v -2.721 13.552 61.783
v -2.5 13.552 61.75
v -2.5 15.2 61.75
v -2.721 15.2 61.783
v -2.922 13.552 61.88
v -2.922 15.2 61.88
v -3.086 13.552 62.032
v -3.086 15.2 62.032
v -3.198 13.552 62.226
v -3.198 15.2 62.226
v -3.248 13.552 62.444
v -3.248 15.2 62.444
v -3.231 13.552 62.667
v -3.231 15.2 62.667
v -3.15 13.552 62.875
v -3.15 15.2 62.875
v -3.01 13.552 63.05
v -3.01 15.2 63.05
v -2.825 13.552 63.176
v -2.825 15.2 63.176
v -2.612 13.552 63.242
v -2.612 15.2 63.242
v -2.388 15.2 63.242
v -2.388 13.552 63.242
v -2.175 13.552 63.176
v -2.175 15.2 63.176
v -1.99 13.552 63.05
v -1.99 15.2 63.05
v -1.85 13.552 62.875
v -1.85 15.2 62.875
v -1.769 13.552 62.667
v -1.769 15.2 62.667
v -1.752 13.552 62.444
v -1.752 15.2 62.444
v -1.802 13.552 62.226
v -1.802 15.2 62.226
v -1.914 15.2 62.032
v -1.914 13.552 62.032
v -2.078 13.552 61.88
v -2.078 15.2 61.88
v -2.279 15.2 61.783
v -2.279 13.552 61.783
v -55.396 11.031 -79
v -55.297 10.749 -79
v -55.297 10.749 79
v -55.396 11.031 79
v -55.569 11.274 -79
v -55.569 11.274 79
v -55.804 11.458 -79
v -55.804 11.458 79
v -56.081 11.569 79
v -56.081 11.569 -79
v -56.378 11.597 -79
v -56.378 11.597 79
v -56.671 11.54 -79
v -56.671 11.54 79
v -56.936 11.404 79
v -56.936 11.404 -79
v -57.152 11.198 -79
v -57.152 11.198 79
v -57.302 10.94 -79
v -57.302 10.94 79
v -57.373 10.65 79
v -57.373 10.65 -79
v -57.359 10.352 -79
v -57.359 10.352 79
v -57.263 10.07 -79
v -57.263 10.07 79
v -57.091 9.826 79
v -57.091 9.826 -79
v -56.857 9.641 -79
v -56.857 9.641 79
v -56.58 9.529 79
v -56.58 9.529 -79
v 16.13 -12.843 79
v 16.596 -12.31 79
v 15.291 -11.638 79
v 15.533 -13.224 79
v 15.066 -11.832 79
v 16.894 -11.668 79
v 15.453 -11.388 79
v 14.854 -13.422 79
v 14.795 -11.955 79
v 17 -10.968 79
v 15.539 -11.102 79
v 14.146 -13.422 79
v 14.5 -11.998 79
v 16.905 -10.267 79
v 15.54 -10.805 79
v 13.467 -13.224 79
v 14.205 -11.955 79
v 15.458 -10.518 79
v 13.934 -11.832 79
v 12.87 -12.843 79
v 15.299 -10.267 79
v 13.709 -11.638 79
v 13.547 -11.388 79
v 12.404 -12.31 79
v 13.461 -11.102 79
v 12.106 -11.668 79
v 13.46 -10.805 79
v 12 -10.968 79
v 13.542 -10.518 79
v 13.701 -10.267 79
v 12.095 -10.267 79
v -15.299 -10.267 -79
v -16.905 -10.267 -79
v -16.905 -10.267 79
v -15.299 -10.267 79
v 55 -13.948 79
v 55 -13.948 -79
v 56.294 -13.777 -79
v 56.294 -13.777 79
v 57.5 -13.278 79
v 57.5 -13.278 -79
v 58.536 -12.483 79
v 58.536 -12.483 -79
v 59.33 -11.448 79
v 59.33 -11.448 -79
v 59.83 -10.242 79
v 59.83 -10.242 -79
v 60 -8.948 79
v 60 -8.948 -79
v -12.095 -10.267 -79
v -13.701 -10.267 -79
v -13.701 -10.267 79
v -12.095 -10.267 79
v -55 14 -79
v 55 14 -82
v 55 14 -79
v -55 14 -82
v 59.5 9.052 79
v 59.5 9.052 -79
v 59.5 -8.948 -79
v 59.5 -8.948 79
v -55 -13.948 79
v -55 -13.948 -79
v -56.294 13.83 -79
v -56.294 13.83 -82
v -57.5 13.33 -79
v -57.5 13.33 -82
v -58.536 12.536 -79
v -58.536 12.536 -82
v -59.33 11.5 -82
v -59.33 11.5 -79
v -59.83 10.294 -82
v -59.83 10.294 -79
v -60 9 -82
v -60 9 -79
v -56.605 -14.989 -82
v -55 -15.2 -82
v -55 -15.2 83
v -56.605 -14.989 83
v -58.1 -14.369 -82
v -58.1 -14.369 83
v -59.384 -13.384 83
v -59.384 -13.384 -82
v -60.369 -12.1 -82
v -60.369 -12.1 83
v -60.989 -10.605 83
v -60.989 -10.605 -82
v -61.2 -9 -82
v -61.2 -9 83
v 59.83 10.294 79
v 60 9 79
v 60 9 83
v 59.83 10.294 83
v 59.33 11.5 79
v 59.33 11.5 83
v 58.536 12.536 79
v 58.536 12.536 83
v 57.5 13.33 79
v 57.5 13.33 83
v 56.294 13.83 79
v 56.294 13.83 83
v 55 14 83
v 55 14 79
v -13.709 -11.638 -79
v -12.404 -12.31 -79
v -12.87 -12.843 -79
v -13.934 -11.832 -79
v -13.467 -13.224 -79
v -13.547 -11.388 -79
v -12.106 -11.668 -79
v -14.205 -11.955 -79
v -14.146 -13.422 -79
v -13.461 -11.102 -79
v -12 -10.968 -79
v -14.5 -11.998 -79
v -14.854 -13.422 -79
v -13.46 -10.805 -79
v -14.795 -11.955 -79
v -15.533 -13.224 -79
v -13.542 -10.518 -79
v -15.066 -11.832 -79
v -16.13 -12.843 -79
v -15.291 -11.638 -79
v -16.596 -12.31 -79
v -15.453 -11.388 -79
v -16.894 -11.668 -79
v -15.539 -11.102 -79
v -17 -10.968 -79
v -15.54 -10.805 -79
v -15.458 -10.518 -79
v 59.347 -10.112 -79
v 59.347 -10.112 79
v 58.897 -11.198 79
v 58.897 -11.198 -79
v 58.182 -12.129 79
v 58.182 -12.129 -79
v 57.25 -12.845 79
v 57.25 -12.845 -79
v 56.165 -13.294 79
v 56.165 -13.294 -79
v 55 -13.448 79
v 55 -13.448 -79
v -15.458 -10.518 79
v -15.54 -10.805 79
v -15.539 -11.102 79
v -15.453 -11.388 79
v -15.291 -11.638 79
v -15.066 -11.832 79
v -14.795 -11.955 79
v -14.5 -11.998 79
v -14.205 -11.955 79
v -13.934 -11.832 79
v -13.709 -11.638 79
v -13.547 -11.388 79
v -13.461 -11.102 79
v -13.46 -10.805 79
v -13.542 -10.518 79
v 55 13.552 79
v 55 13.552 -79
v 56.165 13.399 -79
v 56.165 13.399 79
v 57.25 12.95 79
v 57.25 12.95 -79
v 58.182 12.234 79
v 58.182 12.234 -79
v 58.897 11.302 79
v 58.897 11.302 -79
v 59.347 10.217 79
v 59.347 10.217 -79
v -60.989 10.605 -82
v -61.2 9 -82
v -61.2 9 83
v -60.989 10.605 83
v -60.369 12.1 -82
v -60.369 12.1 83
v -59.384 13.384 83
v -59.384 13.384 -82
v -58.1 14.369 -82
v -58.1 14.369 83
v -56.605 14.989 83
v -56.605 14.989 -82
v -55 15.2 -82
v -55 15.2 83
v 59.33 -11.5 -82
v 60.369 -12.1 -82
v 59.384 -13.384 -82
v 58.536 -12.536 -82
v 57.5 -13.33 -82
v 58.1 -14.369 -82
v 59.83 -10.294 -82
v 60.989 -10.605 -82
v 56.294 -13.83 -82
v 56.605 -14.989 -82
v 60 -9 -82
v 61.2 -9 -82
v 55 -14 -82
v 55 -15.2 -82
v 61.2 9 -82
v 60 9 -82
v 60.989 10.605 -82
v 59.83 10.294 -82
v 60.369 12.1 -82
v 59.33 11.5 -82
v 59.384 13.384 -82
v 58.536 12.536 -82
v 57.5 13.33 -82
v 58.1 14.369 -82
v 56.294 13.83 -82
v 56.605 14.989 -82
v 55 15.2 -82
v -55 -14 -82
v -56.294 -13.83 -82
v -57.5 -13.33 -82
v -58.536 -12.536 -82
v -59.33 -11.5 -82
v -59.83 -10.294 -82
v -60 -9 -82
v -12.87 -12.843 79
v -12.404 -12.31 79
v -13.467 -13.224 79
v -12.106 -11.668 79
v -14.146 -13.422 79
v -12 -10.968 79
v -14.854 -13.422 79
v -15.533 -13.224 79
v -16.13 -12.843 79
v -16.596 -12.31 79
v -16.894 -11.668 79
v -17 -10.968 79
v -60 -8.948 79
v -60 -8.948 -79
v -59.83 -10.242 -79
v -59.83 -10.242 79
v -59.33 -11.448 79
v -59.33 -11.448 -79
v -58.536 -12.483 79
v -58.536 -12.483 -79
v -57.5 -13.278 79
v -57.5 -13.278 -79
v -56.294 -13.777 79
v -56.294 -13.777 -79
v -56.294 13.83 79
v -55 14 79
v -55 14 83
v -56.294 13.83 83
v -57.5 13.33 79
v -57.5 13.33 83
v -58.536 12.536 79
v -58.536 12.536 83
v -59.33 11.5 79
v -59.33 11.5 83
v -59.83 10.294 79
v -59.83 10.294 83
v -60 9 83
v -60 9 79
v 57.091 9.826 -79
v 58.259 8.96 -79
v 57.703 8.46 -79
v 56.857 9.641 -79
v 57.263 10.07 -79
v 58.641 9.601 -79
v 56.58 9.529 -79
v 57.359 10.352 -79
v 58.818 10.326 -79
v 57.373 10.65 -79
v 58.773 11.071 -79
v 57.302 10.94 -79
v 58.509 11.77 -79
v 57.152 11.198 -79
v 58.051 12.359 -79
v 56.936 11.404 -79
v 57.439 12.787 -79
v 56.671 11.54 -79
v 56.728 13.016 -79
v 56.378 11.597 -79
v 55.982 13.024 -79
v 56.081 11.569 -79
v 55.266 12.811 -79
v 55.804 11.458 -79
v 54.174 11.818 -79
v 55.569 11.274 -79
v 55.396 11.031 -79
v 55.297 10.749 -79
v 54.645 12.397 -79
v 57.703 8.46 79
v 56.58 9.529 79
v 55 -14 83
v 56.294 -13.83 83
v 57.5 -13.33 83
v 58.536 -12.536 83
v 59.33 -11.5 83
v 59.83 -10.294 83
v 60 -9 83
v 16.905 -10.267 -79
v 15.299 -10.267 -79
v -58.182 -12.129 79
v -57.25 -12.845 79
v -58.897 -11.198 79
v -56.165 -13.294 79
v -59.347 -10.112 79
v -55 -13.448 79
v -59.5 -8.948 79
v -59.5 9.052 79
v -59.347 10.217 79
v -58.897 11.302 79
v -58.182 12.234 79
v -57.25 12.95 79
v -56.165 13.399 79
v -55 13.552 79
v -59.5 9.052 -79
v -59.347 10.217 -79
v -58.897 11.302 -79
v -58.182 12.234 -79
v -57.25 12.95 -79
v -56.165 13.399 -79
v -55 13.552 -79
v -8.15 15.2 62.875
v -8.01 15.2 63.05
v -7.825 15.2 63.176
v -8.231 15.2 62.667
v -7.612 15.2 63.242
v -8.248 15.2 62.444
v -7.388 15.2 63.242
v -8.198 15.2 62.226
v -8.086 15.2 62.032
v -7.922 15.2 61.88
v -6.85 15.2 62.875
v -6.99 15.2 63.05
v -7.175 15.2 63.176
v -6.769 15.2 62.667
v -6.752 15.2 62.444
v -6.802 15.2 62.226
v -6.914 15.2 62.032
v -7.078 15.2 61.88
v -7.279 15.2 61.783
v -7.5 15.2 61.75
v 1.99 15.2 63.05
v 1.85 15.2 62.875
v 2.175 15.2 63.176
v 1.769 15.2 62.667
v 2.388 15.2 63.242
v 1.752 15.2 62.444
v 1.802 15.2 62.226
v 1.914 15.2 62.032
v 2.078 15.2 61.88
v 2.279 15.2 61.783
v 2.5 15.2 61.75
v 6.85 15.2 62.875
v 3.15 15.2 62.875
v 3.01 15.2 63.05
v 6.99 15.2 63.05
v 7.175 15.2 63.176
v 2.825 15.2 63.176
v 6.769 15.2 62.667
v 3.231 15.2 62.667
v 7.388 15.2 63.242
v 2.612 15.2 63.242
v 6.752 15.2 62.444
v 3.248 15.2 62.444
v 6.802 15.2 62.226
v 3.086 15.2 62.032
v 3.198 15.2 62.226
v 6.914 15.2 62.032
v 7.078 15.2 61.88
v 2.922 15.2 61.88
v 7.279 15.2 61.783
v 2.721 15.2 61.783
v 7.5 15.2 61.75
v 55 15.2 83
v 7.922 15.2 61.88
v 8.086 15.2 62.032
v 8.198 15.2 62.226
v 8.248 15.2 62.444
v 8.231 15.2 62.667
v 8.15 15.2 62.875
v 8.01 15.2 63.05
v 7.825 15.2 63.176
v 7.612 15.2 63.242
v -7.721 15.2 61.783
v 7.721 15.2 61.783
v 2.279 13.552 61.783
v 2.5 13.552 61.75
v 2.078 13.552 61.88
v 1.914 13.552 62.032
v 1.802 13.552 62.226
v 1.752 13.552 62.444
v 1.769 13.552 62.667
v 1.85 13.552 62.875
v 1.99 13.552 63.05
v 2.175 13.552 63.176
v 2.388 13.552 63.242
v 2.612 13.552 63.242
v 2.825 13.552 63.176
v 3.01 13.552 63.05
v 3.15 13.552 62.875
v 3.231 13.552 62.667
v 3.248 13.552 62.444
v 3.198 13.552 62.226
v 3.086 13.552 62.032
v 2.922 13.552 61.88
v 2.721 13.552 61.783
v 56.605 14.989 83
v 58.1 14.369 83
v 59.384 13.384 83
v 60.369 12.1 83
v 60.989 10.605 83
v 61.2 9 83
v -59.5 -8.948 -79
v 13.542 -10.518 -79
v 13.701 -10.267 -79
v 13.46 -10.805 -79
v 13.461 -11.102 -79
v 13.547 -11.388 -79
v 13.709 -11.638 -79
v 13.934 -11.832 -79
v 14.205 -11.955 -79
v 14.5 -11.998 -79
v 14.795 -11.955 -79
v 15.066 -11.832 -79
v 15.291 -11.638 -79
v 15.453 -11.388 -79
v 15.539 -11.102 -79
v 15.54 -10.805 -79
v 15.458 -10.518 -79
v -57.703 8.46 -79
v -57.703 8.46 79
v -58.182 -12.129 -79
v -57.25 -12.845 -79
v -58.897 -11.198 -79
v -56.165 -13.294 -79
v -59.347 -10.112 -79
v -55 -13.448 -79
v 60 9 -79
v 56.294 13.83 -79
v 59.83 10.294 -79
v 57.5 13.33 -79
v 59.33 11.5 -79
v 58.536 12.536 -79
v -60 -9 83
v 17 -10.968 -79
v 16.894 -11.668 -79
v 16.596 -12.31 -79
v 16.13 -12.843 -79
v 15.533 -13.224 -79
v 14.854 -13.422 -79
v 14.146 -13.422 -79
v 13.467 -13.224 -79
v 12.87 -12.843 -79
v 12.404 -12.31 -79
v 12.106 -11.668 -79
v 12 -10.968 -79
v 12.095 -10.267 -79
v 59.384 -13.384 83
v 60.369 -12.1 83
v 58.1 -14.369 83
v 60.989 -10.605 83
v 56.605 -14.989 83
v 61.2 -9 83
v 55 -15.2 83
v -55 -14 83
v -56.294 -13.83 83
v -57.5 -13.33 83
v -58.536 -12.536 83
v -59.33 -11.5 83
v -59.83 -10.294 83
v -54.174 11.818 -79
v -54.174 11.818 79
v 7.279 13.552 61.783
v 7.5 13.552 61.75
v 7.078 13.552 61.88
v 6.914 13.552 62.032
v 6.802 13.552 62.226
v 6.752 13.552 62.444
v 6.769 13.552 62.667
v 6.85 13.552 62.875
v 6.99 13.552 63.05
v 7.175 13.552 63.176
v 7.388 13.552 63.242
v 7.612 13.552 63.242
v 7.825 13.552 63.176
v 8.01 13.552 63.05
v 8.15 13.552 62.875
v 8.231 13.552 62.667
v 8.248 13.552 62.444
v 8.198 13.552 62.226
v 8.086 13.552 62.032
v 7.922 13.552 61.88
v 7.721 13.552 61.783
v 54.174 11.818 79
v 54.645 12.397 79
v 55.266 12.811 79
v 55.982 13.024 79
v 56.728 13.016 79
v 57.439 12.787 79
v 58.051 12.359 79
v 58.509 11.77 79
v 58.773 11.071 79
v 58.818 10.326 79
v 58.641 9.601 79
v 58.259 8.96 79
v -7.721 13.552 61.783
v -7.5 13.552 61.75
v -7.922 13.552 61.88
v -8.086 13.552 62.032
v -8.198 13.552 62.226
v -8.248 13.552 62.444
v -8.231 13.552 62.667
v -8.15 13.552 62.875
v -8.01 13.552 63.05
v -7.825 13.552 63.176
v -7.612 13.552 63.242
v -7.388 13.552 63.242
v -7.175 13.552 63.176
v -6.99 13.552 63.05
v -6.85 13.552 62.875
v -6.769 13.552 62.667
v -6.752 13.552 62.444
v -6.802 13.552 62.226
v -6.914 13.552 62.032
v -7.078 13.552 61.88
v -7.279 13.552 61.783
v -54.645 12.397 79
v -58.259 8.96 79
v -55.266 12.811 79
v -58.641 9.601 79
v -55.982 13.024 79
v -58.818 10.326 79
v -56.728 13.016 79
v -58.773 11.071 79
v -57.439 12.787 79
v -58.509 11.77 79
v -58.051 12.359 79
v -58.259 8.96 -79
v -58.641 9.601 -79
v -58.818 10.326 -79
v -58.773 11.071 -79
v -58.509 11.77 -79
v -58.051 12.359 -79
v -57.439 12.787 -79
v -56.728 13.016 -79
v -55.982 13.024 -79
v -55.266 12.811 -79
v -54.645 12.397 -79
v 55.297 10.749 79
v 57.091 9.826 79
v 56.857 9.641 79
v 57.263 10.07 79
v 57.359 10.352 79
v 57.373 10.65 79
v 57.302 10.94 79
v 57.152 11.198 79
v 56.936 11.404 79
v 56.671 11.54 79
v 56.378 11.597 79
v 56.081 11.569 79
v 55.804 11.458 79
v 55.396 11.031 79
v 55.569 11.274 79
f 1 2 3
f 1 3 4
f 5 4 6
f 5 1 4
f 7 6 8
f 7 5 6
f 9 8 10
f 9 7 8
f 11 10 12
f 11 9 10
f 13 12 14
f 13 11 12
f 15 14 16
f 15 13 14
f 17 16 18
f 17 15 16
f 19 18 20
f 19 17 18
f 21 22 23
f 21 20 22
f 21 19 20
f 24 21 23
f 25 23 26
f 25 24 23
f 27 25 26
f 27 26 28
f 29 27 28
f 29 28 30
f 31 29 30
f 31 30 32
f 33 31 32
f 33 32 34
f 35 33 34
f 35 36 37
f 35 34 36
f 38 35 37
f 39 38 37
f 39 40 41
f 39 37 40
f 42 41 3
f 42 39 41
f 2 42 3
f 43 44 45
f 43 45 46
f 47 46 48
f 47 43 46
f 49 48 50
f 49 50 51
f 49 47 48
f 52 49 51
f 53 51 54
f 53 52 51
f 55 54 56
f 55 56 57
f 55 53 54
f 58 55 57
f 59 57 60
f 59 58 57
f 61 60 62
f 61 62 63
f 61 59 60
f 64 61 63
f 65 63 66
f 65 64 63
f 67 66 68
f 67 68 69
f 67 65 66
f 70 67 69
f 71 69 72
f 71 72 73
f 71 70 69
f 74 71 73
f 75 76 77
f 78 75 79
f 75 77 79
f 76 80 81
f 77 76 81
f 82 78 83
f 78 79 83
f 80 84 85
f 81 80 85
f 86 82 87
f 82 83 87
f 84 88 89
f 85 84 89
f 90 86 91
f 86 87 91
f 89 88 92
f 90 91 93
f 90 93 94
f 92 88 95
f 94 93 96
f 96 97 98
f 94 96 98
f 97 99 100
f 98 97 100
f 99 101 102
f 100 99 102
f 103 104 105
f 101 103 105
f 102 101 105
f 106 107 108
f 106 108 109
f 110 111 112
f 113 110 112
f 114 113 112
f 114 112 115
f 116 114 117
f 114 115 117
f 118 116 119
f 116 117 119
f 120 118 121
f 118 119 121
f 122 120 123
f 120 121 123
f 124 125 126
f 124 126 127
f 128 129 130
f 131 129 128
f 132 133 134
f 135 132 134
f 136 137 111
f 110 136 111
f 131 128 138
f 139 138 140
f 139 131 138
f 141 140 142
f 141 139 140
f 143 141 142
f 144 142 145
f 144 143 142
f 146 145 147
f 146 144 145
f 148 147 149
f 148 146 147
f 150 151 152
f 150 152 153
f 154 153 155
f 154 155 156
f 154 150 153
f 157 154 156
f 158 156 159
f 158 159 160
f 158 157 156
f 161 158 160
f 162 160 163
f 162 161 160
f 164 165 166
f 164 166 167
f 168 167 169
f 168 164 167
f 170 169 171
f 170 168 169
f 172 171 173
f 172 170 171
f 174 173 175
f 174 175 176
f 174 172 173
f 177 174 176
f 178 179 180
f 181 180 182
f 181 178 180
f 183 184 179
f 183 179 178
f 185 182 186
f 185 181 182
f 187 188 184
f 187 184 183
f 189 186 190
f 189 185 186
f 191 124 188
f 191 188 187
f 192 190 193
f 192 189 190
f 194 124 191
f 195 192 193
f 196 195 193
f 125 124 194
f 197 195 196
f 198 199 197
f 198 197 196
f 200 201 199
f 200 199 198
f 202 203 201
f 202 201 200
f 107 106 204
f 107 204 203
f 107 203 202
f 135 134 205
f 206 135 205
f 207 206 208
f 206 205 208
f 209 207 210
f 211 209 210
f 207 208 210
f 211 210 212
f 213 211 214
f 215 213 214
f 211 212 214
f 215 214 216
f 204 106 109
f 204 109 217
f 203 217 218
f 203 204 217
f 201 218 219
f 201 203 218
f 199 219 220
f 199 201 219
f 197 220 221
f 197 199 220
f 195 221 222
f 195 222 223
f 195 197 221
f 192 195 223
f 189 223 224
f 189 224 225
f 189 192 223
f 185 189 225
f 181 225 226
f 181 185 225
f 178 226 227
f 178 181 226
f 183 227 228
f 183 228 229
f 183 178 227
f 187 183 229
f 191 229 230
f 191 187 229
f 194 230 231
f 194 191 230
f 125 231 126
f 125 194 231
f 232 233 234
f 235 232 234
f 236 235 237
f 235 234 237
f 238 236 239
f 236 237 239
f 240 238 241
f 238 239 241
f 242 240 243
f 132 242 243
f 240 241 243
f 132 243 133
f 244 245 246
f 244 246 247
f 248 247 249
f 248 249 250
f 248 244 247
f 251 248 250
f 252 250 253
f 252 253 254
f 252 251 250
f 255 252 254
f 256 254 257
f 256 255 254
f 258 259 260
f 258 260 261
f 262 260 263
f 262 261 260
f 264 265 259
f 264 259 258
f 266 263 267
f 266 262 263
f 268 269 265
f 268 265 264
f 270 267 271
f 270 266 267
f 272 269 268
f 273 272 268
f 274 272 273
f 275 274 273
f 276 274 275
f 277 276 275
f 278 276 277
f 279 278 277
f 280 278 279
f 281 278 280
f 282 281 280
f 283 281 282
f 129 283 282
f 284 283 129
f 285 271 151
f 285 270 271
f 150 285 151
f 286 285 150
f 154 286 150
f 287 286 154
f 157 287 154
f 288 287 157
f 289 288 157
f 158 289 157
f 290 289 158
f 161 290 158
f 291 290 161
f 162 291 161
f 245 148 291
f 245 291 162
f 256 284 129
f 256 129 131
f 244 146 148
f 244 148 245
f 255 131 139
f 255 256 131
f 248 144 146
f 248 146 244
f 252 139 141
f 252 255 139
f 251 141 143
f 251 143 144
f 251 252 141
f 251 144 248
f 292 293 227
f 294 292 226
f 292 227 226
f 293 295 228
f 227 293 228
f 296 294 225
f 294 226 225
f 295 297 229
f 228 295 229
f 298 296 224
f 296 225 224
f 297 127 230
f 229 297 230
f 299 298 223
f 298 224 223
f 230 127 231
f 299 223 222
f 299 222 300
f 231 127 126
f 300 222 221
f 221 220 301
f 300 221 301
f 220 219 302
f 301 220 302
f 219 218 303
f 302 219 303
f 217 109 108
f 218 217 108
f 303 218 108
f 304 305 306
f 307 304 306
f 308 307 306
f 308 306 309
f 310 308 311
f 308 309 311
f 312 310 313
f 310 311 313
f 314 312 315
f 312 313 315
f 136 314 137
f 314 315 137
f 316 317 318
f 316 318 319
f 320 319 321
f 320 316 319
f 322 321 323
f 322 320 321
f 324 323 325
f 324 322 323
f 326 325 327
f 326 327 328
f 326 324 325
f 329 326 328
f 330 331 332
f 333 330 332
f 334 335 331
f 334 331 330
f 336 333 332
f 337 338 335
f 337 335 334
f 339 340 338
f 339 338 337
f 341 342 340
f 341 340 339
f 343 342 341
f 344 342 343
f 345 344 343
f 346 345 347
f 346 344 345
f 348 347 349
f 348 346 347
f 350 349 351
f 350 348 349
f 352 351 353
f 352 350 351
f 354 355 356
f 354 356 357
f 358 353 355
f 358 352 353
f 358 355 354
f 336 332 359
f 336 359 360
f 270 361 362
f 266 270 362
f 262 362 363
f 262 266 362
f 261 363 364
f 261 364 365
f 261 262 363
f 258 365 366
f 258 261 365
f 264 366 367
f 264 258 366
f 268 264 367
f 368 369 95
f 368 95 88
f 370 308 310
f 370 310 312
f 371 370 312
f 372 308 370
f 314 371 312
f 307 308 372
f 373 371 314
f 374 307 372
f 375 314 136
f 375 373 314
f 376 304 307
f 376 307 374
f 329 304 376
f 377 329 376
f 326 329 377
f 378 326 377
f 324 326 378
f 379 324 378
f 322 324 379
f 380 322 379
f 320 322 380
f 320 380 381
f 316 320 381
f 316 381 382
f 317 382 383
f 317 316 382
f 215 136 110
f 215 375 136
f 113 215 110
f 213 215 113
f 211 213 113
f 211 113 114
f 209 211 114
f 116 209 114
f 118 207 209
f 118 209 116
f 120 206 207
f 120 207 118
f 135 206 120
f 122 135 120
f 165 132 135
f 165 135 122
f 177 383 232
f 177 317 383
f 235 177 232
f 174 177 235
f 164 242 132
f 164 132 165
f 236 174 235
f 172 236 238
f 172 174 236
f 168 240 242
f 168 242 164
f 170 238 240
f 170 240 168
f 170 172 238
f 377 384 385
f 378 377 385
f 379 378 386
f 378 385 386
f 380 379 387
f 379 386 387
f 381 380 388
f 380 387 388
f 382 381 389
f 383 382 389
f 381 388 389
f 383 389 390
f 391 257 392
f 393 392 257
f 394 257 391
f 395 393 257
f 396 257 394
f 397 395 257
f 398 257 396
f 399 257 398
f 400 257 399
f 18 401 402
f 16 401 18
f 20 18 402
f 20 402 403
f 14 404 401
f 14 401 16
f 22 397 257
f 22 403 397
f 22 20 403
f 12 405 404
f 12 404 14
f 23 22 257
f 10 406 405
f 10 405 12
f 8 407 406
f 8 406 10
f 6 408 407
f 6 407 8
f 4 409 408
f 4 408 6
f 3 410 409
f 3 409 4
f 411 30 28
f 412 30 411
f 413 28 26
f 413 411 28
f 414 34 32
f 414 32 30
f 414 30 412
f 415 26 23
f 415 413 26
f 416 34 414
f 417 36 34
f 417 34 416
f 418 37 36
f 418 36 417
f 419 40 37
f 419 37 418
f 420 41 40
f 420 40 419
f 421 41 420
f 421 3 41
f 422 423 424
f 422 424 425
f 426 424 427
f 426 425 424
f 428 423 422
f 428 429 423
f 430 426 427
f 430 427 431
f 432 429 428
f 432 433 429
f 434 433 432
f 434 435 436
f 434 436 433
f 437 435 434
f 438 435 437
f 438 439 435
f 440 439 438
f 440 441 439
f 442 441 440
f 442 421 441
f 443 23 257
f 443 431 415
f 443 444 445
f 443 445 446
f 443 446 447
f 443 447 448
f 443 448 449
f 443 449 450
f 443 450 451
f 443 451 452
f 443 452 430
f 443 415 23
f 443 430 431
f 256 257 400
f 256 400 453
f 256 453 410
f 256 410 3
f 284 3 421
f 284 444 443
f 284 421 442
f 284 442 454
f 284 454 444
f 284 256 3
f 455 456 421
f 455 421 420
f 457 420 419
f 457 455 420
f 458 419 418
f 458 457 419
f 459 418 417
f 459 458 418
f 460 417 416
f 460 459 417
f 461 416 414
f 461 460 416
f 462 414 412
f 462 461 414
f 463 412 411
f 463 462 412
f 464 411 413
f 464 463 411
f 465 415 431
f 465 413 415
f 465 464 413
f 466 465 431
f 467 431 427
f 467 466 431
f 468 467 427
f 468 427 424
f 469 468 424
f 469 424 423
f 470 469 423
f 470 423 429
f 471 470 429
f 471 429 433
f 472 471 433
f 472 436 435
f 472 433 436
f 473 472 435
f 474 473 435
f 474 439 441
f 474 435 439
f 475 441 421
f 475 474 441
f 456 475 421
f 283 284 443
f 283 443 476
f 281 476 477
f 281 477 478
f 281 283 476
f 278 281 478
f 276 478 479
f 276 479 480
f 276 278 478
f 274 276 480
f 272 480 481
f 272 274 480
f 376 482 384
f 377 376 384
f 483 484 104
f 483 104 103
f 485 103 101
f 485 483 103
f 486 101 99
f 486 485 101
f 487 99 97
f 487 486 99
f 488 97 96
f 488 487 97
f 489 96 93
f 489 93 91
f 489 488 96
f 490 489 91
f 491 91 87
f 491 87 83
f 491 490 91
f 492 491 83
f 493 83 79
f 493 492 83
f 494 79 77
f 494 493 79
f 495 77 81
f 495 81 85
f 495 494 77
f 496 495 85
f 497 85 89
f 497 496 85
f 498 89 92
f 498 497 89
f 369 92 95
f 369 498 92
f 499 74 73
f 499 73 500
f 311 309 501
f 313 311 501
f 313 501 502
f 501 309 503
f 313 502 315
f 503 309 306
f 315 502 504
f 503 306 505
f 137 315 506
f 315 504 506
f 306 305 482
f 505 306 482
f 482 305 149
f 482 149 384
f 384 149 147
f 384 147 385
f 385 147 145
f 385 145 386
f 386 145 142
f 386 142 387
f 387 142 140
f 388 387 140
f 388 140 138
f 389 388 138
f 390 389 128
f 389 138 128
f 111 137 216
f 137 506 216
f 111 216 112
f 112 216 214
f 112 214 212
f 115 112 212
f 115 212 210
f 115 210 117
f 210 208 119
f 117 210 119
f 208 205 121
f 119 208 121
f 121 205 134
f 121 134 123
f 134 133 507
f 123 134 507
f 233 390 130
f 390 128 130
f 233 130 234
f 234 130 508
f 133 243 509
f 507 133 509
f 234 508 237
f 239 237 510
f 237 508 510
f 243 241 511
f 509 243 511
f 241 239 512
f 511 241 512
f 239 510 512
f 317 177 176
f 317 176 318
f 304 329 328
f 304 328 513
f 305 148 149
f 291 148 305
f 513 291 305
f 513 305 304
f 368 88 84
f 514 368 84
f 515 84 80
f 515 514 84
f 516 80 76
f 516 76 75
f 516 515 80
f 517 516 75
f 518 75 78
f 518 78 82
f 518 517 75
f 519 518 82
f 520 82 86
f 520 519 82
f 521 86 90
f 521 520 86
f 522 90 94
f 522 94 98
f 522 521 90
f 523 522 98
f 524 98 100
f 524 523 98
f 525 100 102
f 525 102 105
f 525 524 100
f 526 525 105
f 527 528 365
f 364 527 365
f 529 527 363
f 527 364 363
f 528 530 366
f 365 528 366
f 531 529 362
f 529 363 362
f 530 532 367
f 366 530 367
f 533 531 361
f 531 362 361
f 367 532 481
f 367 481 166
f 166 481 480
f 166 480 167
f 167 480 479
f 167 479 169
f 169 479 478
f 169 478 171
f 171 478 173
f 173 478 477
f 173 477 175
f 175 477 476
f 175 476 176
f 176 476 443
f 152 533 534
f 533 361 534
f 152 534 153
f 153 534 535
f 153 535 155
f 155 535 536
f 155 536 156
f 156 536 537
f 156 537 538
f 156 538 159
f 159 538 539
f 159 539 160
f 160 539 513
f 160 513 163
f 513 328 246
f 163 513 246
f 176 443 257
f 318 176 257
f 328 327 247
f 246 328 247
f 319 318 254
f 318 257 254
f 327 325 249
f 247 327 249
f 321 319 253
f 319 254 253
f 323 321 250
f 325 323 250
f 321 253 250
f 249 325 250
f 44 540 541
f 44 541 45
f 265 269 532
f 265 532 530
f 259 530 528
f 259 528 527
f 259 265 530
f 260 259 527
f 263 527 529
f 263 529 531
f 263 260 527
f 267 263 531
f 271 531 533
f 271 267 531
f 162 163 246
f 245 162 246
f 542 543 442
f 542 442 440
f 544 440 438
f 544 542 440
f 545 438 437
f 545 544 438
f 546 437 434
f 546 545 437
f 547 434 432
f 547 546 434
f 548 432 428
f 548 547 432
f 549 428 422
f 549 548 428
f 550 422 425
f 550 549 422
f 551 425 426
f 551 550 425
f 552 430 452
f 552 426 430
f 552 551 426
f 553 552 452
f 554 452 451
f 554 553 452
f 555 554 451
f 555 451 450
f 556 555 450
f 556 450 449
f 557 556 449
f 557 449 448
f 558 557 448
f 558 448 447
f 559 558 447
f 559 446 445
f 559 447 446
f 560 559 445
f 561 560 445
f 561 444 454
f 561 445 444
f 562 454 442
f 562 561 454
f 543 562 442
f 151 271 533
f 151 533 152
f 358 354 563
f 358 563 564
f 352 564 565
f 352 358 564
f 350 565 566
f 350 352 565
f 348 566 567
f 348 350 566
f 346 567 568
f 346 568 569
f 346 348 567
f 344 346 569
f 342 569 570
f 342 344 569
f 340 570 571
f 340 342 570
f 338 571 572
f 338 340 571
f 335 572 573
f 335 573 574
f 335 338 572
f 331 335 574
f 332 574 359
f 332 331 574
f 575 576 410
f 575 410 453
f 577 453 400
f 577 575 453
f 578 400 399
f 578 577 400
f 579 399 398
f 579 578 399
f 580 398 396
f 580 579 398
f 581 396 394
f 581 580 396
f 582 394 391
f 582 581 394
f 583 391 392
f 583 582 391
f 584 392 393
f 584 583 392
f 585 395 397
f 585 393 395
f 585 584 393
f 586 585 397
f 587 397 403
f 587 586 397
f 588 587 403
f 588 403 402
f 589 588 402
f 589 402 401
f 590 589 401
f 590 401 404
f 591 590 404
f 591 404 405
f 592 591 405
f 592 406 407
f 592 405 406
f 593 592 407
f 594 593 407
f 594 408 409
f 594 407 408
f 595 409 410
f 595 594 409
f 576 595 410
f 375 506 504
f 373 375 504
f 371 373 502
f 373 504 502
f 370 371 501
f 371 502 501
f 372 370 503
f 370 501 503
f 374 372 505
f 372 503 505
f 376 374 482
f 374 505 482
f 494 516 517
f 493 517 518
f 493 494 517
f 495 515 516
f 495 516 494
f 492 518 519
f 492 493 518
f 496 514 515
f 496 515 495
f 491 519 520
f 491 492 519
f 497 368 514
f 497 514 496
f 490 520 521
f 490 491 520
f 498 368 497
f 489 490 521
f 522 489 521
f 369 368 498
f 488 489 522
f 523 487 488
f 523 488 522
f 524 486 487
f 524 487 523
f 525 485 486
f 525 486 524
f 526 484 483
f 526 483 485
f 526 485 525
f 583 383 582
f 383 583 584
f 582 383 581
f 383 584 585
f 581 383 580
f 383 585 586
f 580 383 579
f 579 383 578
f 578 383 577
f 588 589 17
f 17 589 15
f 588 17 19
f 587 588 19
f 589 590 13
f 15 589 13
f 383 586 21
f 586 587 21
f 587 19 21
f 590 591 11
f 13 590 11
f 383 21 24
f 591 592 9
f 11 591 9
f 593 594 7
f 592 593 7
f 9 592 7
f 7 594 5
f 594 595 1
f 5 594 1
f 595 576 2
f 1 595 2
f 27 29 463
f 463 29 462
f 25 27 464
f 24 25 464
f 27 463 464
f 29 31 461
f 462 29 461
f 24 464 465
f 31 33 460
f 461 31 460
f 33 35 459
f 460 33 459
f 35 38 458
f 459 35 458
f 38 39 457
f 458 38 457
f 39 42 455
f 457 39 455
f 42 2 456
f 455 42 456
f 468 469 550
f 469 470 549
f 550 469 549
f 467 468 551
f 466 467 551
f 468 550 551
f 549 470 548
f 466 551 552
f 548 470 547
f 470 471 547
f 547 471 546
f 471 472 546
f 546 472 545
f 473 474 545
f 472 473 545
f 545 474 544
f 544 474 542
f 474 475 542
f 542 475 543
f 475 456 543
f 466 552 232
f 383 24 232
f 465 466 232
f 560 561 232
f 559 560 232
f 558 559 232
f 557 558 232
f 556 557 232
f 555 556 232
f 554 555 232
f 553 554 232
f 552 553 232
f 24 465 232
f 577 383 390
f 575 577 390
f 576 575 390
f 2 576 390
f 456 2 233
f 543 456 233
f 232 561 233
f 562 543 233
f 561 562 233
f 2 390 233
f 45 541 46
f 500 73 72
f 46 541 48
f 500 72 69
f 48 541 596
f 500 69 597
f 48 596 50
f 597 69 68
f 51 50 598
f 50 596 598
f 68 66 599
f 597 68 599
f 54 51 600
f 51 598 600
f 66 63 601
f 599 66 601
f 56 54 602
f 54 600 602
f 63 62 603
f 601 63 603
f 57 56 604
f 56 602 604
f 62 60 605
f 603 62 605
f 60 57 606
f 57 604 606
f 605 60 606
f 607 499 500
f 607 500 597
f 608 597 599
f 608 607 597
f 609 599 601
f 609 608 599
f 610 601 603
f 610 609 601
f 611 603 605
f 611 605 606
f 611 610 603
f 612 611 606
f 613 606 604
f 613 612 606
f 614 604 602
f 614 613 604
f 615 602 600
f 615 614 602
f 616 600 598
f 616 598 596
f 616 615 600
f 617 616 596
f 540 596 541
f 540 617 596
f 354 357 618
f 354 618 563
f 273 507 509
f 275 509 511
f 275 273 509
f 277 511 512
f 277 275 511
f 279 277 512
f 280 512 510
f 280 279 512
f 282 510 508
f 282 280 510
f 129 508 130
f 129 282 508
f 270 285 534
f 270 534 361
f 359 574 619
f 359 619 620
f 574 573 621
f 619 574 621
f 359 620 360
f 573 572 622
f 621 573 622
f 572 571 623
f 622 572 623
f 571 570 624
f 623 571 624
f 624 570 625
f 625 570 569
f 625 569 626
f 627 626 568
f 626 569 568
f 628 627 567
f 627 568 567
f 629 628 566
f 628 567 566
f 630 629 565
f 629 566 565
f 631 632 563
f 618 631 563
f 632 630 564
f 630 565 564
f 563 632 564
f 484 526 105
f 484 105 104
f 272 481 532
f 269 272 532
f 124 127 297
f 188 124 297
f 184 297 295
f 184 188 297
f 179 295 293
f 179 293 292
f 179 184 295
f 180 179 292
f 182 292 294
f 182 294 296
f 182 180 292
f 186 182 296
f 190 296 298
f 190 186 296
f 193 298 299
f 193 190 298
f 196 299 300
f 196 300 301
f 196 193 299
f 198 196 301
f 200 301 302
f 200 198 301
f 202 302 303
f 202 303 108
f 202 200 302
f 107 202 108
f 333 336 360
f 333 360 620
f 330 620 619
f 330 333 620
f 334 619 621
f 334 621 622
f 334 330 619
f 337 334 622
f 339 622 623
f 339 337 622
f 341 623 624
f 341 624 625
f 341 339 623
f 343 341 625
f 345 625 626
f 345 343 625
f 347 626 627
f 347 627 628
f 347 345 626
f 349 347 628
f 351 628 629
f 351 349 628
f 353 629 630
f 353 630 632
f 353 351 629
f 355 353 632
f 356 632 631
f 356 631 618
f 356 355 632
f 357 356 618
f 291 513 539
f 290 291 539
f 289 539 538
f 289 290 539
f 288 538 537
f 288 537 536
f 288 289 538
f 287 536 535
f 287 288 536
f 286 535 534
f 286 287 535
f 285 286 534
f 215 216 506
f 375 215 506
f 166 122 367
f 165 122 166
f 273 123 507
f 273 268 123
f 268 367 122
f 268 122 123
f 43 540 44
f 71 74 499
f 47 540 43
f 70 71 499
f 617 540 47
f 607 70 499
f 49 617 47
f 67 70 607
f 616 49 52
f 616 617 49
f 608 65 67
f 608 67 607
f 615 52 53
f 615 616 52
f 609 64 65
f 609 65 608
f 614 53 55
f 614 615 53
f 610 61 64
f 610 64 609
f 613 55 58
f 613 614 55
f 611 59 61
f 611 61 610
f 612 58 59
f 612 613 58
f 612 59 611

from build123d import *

# Parameters (mm, degrees)
BOSS_EXTRUDE2_DEPTH        = 83
BOSS_EXTRUDE2_DEPTH_BACK   = 82
BOSS_EXTRUDE3_DEPTH        = 79
BOSS_EXTRUDE3_DEPTH_BACK   = 79
BOSS_EXTRUDE5_DEPTH        = 79
BOSS_EXTRUDE5_DEPTH_BACK   = 79
BOSS_EXTRUDE5_2_DEPTH      = 79
BOSS_EXTRUDE5_2_DEPTH_BACK = 79
BOSS_EXTRUDE5_3_DEPTH      = 79
BOSS_EXTRUDE5_3_DEPTH_BACK = 79
BOSS_EXTRUDE5_4_DEPTH      = 79
BOSS_EXTRUDE5_4_DEPTH_BACK = 79
SKETCH9_R                  = 0.75
CUT_EXTRUDE3_DEPTH         = 79


with BuildPart() as part:
    # Sketch1 → Boss-Extrude2 (new, two sides: drawn at the far end of the back side and taken through both)
    with BuildSketch(Plane.XY.offset(-BOSS_EXTRUDE2_DEPTH_BACK)):
        with BuildLine():
            ThreePointArc((55, 15.2), (59.384062043, 13.384062043), (61.2, 9))
            Line((61.2, 9), (61.2, -9))
            ThreePointArc((61.2, -9), (59.384062043, -13.384062043), (55, -15.2))
            Line((55, -15.2), (0, -15.2))
            Line((0, -15.2), (-55, -15.2))
            ThreePointArc((-55, -15.2), (-59.384062043, -13.384062043), (-61.2, -9))
            Line((-61.2, -9), (-61.2, 9))
            ThreePointArc((-61.2, 9), (-59.384062043, 13.384062043), (-55, 15.2))
            Line((-55, 15.2), (0, 15.2))
            Line((0, 15.2), (55, 15.2))
        make_face()
        with BuildLine():
            ThreePointArc((-55, 14), (-58.535533906, 12.535533906), (-60, 9))
            Line((-60, 9), (-60, -9))
            ThreePointArc((-60, -9), (-58.535533906, -12.535533906), (-55, -14))
            Line((-55, -14), (0, -14))
            Line((0, -14), (55, -14))
            ThreePointArc((55, -14), (58.535533906, -12.535533906), (60, -9))
            Line((60, -9), (60, 9))
            ThreePointArc((60, 9), (58.535533906, 12.535533906), (55, 14))
            Line((55, 14), (0, 14))
            Line((0, 14), (-55, 14))
        make_face(mode=Mode.SUBTRACT)
    extrude(amount=BOSS_EXTRUDE2_DEPTH + BOSS_EXTRUDE2_DEPTH_BACK)

    # Sketch2 → Boss-Extrude3 (add, two sides: drawn at the far end of the back side and taken through both)
    with BuildSketch(Plane.XY.offset(-BOSS_EXTRUDE3_DEPTH_BACK)):
        with BuildLine():
            Line((0, 14.052488348), (-55, 14.052488348))
            ThreePointArc((-55, 14.052488348), (-58.535533906, 12.588022254), (-60, 9.052488348))
            Line((-60, 9.052488348), (-60, -8.947511652))
            ThreePointArc((-60, -8.947511652), (-58.535533906, -12.483045558), (-55, -13.947511652))
            Line((-55, -13.947511652), (0, -13.947511652))
            Line((0, -13.947511652), (55, -13.947511652))
            ThreePointArc((55, -13.947511652), (58.535533906, -12.483045558), (60, -8.947511652))
            Line((60, -8.947511652), (60, 9.052488348))
            ThreePointArc((60, 9.052488348), (58.535533906, 12.588022254), (55, 14.052488348))
            Line((55, 14.052488348), (0, 14.052488348))
        make_face()
        with BuildLine():
            Line((0, 13.552488348), (55, 13.552488348))
            ThreePointArc((55, 13.552488348), (58.181980515, 12.234468864), (59.5, 9.052488348))
            Line((59.5, 9.052488348), (59.5, -8.947511652))
            ThreePointArc((59.5, -8.947511652), (58.181980515, -12.129492167), (55, -13.447511652))
            Line((55, -13.447511652), (0, -13.447511652))
            Line((0, -13.447511652), (-55, -13.447511652))
            ThreePointArc((-55, -13.447511652), (-58.181980515, -12.129492167), (-59.5, -8.947511652))
            Line((-59.5, -8.947511652), (-59.5, 9.052488348))
            ThreePointArc((-59.5, 9.052488348), (-58.181980515, 12.234468864), (-55, 13.552488348))
            Line((-55, 13.552488348), (0, 13.552488348))
        make_face(mode=Mode.SUBTRACT)
    extrude(amount=BOSS_EXTRUDE3_DEPTH + BOSS_EXTRUDE3_DEPTH_BACK)

    # Sketch9 → Cut-Extrude3 (cut)
    with BuildSketch(Plane(origin=(0, 0, 0), x_dir=(1, 0, 0), z_dir=(0, 1, 0))):
        with Locations(Location((-7.5, -62.5, 0), (0, 0, 90))):
            Circle(SKETCH9_R)
        with Locations(Location((-2.5, -62.5, 0), (0, 0, 90))):
            Circle(SKETCH9_R)
        with Locations(Location((2.5, -62.5, 0), (0, 0, 90))):
            Circle(SKETCH9_R)
        with Locations(Location((7.5, -62.5, 0), (0, 0, 90))):
            Circle(SKETCH9_R)
    extrude(amount=CUT_EXTRUDE3_DEPTH, mode=Mode.SUBTRACT)


with BuildPart() as body_2:
    # Sketch3 → Boss-Extrude5 (new, two sides: drawn at the far end of the back side and taken through both)
    with BuildSketch(Plane.XY.offset(-BOSS_EXTRUDE5_DEPTH_BACK)):
        with BuildLine():
            ThreePointArc((-55.297347491, 10.749147187), (-57.051582041, 11.308821518), (-56.580263808, 9.528812154))
            Line((-56.580263808, 9.528812154), (-57.7034092, 8.460454342))
            ThreePointArc((-57.7034092, 8.460454342), (-58.050942002, 12.359430707), (-54.174202099, 11.817504998))
            Line((-54.174202099, 11.817504998), (-55.297347491, 10.749147187))
        make_face()
    extrude(amount=BOSS_EXTRUDE5_DEPTH + BOSS_EXTRUDE5_DEPTH_BACK)


with BuildPart() as body_3:
    # Sketch3 → Boss-Extrude5 2 (new, two sides: drawn at the far end of the back side and taken through both)
    with BuildSketch(Plane.XY.offset(-BOSS_EXTRUDE5_2_DEPTH_BACK)):
        with BuildLine():
            ThreePointArc((-15.299294362, -10.266608926), (-14.5, -11.997511652), (-13.700705638, -10.266608926))
            Line((-13.700705638, -10.266608926), (-12.094512216, -10.266608926))
            ThreePointArc((-12.094512216, -10.266608926), (-14.5, -13.447511652), (-16.905487784, -10.266608926))
            Line((-16.905487784, -10.266608926), (-15.299294362, -10.266608926))
        make_face()
    extrude(amount=BOSS_EXTRUDE5_2_DEPTH + BOSS_EXTRUDE5_2_DEPTH_BACK)


with BuildPart() as body_4:
    # Sketch3 → Boss-Extrude5 3 (new, two sides: drawn at the far end of the back side and taken through both)
    with BuildSketch(Plane.XY.offset(-BOSS_EXTRUDE5_3_DEPTH_BACK)):
        with BuildLine():
            ThreePointArc((16.905487784, -10.266608926), (14.5, -13.447511652), (12.094512216, -10.266608926))
            Line((12.094512216, -10.266608926), (13.700705638, -10.266608926))
            ThreePointArc((13.700705638, -10.266608926), (14.5, -11.997511652), (15.299294362, -10.266608926))
            Line((15.299294362, -10.266608926), (16.905487784, -10.266608926))
        make_face()
    extrude(amount=BOSS_EXTRUDE5_3_DEPTH + BOSS_EXTRUDE5_3_DEPTH_BACK)


with BuildPart() as body_5:
    # Sketch3 → Boss-Extrude5 4 (new, two sides: drawn at the far end of the back side and taken through both)
    with BuildSketch(Plane.XY.offset(-BOSS_EXTRUDE5_4_DEPTH_BACK)):
        with BuildLine():
            ThreePointArc((54.174202099, 11.817504998), (58.050942002, 12.359430707), (57.7034092, 8.460454342))
            Line((57.7034092, 8.460454342), (56.580263808, 9.528812154))
            ThreePointArc((56.580263808, 9.528812154), (57.051582041, 11.308821518), (55.297347491, 10.749147187))
            Line((55.297347491, 10.749147187), (54.174202099, 11.817504998))
        make_face()
    extrude(amount=BOSS_EXTRUDE5_4_DEPTH + BOSS_EXTRUDE5_4_DEPTH_BACK)


solid = Compound([part.part, body_2.part, body_3.part, body_4.part, body_5.part])
